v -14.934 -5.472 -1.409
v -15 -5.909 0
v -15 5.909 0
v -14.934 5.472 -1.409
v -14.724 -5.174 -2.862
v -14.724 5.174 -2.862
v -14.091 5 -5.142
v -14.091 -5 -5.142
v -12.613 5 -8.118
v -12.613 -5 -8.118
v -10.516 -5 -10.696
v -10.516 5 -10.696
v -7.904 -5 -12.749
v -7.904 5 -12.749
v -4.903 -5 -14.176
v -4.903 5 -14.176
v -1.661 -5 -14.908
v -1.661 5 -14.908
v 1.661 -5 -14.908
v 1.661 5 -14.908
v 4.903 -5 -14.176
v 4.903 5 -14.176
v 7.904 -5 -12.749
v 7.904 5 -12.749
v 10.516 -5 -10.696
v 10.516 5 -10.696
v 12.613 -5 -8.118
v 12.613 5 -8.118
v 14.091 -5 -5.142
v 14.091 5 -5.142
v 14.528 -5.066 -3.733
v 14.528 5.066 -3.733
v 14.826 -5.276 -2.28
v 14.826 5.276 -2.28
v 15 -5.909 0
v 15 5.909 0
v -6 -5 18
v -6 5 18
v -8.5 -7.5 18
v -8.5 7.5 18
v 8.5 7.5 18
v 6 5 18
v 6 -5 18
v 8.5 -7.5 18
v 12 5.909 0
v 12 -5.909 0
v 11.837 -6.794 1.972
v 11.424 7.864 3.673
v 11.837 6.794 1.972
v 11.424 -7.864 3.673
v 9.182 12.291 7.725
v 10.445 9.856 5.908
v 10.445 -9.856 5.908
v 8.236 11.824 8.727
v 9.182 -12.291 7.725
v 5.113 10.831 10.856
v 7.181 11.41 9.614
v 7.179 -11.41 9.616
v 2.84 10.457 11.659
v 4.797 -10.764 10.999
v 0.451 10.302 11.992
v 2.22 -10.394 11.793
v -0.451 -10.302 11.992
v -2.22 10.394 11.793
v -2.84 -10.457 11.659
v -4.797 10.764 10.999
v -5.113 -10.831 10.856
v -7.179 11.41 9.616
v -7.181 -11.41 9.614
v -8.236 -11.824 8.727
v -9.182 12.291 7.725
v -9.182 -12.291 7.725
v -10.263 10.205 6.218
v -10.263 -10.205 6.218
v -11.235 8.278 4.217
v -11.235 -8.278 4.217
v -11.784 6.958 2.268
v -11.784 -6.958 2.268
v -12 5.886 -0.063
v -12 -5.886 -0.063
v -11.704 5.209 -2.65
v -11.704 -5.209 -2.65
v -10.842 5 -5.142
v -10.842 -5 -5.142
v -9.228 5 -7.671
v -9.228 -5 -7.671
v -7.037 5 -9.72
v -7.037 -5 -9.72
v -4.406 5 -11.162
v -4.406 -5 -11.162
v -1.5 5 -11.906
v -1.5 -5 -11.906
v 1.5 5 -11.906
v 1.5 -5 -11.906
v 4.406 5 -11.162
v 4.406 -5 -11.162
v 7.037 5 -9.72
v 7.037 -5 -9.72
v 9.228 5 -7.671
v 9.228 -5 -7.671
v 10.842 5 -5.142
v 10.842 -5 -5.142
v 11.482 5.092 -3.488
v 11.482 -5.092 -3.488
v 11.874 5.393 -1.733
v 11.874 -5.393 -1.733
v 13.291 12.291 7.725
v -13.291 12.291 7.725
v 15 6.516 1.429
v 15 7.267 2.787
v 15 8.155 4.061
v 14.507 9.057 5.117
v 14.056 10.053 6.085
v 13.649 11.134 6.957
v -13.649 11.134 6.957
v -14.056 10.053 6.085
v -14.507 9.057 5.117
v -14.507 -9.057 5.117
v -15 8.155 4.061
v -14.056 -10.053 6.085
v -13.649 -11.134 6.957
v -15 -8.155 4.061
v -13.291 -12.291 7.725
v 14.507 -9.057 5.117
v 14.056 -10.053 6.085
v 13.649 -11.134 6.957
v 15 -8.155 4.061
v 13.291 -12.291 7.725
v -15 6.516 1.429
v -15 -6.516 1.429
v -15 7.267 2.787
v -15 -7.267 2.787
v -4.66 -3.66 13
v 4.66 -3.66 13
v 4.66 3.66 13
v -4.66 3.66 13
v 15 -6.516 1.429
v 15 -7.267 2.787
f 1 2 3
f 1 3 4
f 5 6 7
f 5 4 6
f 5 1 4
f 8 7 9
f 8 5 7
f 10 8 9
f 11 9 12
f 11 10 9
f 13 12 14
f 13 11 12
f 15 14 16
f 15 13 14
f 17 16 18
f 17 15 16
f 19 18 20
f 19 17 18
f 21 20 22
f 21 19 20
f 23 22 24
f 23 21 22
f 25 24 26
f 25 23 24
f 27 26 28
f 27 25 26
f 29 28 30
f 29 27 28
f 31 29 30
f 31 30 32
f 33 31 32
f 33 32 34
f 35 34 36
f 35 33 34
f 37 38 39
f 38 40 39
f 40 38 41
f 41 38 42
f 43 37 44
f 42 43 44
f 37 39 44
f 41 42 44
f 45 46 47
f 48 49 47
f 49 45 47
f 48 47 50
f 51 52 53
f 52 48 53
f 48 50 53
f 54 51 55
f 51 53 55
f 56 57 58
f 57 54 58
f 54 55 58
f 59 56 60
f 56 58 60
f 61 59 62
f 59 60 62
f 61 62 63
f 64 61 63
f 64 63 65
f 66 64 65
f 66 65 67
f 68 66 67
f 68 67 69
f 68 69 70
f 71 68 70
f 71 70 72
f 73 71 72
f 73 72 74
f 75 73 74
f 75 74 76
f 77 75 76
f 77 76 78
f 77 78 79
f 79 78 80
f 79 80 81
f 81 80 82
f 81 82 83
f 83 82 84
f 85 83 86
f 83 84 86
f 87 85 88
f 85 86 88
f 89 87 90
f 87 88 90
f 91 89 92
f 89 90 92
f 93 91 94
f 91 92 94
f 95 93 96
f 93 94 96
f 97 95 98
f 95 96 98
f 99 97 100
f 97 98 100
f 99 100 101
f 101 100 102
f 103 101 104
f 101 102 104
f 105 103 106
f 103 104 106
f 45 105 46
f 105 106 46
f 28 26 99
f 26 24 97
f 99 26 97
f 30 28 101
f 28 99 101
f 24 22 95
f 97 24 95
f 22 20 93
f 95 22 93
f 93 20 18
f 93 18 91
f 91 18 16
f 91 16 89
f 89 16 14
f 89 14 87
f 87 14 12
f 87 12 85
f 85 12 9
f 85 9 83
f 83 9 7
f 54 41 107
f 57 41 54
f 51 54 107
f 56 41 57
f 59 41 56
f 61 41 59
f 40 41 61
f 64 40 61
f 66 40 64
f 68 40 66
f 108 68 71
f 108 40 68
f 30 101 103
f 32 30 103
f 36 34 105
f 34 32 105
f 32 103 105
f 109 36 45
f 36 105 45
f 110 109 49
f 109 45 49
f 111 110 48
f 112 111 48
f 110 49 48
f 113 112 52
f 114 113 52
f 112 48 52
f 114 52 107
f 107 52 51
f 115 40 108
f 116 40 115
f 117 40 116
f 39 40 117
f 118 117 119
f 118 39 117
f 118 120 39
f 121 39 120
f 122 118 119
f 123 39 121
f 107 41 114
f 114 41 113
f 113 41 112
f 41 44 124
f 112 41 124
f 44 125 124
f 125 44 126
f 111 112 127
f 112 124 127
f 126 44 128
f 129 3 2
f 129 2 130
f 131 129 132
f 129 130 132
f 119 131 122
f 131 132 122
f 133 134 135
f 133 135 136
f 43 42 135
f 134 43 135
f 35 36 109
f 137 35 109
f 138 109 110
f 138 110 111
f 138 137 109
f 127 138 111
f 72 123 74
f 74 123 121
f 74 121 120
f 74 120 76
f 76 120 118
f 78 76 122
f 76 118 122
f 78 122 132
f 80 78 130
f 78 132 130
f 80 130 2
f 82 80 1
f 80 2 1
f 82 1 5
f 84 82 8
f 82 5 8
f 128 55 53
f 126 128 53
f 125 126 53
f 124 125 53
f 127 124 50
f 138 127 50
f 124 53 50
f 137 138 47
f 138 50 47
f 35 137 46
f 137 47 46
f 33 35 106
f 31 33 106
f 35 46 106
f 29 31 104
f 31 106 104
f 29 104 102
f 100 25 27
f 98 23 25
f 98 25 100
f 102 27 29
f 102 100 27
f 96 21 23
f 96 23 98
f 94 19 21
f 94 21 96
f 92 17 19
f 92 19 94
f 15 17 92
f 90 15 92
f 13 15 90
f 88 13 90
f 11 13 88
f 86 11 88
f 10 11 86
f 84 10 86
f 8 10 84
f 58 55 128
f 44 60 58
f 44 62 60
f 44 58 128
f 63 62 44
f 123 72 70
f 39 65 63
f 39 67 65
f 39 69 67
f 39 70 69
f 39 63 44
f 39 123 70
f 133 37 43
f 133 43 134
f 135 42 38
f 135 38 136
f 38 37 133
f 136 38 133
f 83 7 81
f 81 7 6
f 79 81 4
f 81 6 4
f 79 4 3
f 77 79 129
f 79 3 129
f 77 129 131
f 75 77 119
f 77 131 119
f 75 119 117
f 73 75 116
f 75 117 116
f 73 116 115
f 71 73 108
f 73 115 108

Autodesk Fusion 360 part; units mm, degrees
sketch "草图1" plane through (0, 0, 0) normal (0, 1, 0) x (1, 0, 0)
  circle A0 centre (0, 0) radius 12
  line L0 (-8.5, -18) -> (8.5, -18)
  line L1 (8.5, -18) -> (15, -4.0607)
  line L2 (-8.5, -18) -> (-15, -4.0607)
  line L3 (0, -38) -> (0, 21) construction
  line L4 (-34, 0) -> (39, 0) construction
  line L5 (-15, 0) -> (-15, -4.0607)
  line L6 (15, 0) -> (15, -4.0607)
  arc A1 (15, 0) -> (-15, 0) centre (0, 0) ccw
  dimension "d1" = 30
  dimension "d2" = 24
  dimension "d3" = 18
  dimension "d4" = 65
  dimension "d5" = 17
extrude "拉伸1" add sketch "草图1" along normal mid plane 30 makes body 1
sketch "草图2" plane through (0, 0, 18) normal (0, 0, 1) x (-1, 0, 0)
  line L0 (-8.5, 15) -> (-8.5, -15)
  line L1 (-8.5, -15) -> (8.5, -15)
  line L2 (8.5, -15) -> (8.5, 15)
  line L3 (8.5, 15) -> (-8.5, 15)
  line L4 (-8.5, 7.5) -> (8.5, 7.5)
  line L5 (8.5, 7.5) -> (8.5, -7.5)
  line L6 (8.5, -7.5) -> (-8.5, -7.5)
  line L7 (-8.5, -7.5) -> (-8.5, 7.5)
  line L8 (-8.5, 7.5) -> (8.5, -7.5) construction
  line L9 (8.5, 7.5) -> (-8.5, -7.5) construction
  dimension "d8" = 15
sketch "草图3" plane through (-15, 0, 0) normal (-1, 0, 0) x (0, -1, 0)
  line L0 (15, 4.0607) -> (-15, 4.0607)
  line L1 (-15, 4.0607) -> (-15, 0)
  line L2 (-15, 0) -> (15, 0)
  line L3 (15, 0) -> (15, 4.0607)
  line L4 (-5, -15) -> (5, -15)
  line L5 (5, -15) -> (5, -5.1421)
  line L6 (-5, -15) -> (-5, -5.1421)
  line L7 (-15, 18) -> (15, 18)
  line L8 (15, 18) -> (15, -15)
  line L9 (15, -15) -> (-15, -15)
  line L10 (-15, -15) -> (-15, 18)
  arc A0 (-5, -5.1421) -> (-15, 9) centre (-20, -5.1421) ccw
  arc A1 (15, 9) -> (5, -5.1421) centre (20, -5.1421) ccw
  line L11 (0, 21) -> (0, -19) construction
  point P0 (15, 18)
  dimension "d9" = 9
  dimension "d10" = 10
  dimension "d11" = 15
extrude "拉伸2" cut sketch "草图3" against normal blind 48 contours L0 L2 L3 L8 A1 | L0 L8 A1 | L2 L5 L8 L9 A1 | L0 L1 L2 L10 A0 | L0 L10 A0 | L2 L6 L9 L10 A0 bodies 1
sketch "草图4" plane through (-15, 0, 0) normal (-1, 0, 0) x (0, -1, 0)
  arc A0 (-5.9089, 0) -> (-8.1548, 4.0607) centre (-20, -5.1421) ccw
  line L0 (-5.9089, 0) -> (5.9089, 0)
  arc A1 (8.1548, 4.0607) -> (5.9089, 0) centre (20, -5.1421) ccw
  line L1 (8.1548, 4.0607) -> (-8.1548, 4.0607)
  line L2 (-15, 18) -> (15, 18)
  line L3 (15, 18) -> (15, 9)
  line L4 (15, 9) -> (-15, 9)
  line L5 (-15, 9) -> (-15, 18)
  line L6 (0, 23) -> (0, -21) construction
  line L7 (-7.5, 18) -> (-17.1867, -2.7731)
  line L8 (-17.1867, -2.7731) -> (17.1867, -2.7731)
  line L9 (17.1867, -2.7731) -> (7.5, 18)
  line L10 (-7.5, 18) -> (7.5, 18)
  line L11 (-15, 18) -> (17.1867, 18)
  line L12 (17.1867, 18) -> (17.1867, -2.7731)
  line L13 (17.1867, -2.7731) -> (-15, -2.7731)
  line L14 (-15, -2.7731) -> (-15, 18)
  dimension "d14" = 15
  dimension "d15" = 65
  dimension "d16" = 65
extrude "拉伸3" cut sketch "草图4" against normal blind 39 contours L2 L4 L5 L7 L11 L14 | L4 L7 L14 | L2 L3 L4 L9 L11 | L3 L4 L9 L11 L12 bodies 1
sketch "草图5" plane through (0, 0, 18) normal (0, 0, 1) x (-1, 0, 0)
  line L0 (6, -5) -> (-6, -5)
  line L1 (-6, -5) -> (-6, 5)
  line L2 (-6, 5) -> (6, 5)
  line L3 (6, 5) -> (6, -5)
  line L4 (6, -5) -> (-6, 5) construction
  line L5 (-6, -5) -> (6, 5) construction
  dimension "d19" = 10
  dimension "d20" = 12
extrude "拉伸4" cut sketch "草图5" against normal blind 5 bodies 1
sketch "草图6" plane through (6, 0, 0) normal (-1, 0, 0) x (0, -1, 0)
  line L0 (5, 18) -> (-5, 18)
  line L1 (-5, 18) -> (-5, 13)
  line L2 (-5, 13) -> (5, 13)
  line L3 (5, 13) -> (5, 18)
  line L4 (-5, 18) -> (-5, 13)
  line L5 (5, 13) -> (5, 18)
  line L6 (-5, 18) -> (-3.6603, 13)
  line L7 (5, 18) -> (3.6603, 13)
  line L8 (5, 13) -> (3.6603, 13)
  line L9 (-3.6603, 13) -> (-5, 13)
  line L10 (0, 22) -> (0, 5.5125) construction
  dimension "d23" = 30
extrude "拉伸5" add sketch "草图6" along normal blind 12 separate body contours L2 L3 L5 L7 L8 | L1 L2 L4 L6 L9 makes body 2 at (2, 4.5534, 16.3333) makes body 3 at (-2, -4.1068, 14.6667)
sketch "草图7" plane through (0, -5, 0) normal (0, 1, 0) x (-1, 0, 0)
  line L0 (6, 18) -> (-6, 18)
  line L1 (-6, 18) -> (-6, 13)
  line L2 (-6, 13) -> (6, 13)
  line L3 (6, 13) -> (6, 18)
  line L4 (-6, 18) -> (-6, 13)
  line L5 (0, 24) -> (0, 4) construction
  line L6 (6, 18) -> (6, 13)
  line L7 (-6, 13) -> (6, 13)
  line L8 (6, 18) -> (4.6603, 13)
  line L9 (-6, 18) -> (-4.6603, 13)
  dimension "d26" = 30
extrude "拉伸6" add sketch "草图7" along normal blind 10 separate body contours L2 L3 L6 L7 L8 | L1 L2 L4 L7 L9 makes body 4 at (5.5534, -1.6667, 16.3333) makes body 5 at (-5.5534, -1.6667, 16.3333)
combine "合并1" operation add target body 1 tool bodies 2 3 5 4
